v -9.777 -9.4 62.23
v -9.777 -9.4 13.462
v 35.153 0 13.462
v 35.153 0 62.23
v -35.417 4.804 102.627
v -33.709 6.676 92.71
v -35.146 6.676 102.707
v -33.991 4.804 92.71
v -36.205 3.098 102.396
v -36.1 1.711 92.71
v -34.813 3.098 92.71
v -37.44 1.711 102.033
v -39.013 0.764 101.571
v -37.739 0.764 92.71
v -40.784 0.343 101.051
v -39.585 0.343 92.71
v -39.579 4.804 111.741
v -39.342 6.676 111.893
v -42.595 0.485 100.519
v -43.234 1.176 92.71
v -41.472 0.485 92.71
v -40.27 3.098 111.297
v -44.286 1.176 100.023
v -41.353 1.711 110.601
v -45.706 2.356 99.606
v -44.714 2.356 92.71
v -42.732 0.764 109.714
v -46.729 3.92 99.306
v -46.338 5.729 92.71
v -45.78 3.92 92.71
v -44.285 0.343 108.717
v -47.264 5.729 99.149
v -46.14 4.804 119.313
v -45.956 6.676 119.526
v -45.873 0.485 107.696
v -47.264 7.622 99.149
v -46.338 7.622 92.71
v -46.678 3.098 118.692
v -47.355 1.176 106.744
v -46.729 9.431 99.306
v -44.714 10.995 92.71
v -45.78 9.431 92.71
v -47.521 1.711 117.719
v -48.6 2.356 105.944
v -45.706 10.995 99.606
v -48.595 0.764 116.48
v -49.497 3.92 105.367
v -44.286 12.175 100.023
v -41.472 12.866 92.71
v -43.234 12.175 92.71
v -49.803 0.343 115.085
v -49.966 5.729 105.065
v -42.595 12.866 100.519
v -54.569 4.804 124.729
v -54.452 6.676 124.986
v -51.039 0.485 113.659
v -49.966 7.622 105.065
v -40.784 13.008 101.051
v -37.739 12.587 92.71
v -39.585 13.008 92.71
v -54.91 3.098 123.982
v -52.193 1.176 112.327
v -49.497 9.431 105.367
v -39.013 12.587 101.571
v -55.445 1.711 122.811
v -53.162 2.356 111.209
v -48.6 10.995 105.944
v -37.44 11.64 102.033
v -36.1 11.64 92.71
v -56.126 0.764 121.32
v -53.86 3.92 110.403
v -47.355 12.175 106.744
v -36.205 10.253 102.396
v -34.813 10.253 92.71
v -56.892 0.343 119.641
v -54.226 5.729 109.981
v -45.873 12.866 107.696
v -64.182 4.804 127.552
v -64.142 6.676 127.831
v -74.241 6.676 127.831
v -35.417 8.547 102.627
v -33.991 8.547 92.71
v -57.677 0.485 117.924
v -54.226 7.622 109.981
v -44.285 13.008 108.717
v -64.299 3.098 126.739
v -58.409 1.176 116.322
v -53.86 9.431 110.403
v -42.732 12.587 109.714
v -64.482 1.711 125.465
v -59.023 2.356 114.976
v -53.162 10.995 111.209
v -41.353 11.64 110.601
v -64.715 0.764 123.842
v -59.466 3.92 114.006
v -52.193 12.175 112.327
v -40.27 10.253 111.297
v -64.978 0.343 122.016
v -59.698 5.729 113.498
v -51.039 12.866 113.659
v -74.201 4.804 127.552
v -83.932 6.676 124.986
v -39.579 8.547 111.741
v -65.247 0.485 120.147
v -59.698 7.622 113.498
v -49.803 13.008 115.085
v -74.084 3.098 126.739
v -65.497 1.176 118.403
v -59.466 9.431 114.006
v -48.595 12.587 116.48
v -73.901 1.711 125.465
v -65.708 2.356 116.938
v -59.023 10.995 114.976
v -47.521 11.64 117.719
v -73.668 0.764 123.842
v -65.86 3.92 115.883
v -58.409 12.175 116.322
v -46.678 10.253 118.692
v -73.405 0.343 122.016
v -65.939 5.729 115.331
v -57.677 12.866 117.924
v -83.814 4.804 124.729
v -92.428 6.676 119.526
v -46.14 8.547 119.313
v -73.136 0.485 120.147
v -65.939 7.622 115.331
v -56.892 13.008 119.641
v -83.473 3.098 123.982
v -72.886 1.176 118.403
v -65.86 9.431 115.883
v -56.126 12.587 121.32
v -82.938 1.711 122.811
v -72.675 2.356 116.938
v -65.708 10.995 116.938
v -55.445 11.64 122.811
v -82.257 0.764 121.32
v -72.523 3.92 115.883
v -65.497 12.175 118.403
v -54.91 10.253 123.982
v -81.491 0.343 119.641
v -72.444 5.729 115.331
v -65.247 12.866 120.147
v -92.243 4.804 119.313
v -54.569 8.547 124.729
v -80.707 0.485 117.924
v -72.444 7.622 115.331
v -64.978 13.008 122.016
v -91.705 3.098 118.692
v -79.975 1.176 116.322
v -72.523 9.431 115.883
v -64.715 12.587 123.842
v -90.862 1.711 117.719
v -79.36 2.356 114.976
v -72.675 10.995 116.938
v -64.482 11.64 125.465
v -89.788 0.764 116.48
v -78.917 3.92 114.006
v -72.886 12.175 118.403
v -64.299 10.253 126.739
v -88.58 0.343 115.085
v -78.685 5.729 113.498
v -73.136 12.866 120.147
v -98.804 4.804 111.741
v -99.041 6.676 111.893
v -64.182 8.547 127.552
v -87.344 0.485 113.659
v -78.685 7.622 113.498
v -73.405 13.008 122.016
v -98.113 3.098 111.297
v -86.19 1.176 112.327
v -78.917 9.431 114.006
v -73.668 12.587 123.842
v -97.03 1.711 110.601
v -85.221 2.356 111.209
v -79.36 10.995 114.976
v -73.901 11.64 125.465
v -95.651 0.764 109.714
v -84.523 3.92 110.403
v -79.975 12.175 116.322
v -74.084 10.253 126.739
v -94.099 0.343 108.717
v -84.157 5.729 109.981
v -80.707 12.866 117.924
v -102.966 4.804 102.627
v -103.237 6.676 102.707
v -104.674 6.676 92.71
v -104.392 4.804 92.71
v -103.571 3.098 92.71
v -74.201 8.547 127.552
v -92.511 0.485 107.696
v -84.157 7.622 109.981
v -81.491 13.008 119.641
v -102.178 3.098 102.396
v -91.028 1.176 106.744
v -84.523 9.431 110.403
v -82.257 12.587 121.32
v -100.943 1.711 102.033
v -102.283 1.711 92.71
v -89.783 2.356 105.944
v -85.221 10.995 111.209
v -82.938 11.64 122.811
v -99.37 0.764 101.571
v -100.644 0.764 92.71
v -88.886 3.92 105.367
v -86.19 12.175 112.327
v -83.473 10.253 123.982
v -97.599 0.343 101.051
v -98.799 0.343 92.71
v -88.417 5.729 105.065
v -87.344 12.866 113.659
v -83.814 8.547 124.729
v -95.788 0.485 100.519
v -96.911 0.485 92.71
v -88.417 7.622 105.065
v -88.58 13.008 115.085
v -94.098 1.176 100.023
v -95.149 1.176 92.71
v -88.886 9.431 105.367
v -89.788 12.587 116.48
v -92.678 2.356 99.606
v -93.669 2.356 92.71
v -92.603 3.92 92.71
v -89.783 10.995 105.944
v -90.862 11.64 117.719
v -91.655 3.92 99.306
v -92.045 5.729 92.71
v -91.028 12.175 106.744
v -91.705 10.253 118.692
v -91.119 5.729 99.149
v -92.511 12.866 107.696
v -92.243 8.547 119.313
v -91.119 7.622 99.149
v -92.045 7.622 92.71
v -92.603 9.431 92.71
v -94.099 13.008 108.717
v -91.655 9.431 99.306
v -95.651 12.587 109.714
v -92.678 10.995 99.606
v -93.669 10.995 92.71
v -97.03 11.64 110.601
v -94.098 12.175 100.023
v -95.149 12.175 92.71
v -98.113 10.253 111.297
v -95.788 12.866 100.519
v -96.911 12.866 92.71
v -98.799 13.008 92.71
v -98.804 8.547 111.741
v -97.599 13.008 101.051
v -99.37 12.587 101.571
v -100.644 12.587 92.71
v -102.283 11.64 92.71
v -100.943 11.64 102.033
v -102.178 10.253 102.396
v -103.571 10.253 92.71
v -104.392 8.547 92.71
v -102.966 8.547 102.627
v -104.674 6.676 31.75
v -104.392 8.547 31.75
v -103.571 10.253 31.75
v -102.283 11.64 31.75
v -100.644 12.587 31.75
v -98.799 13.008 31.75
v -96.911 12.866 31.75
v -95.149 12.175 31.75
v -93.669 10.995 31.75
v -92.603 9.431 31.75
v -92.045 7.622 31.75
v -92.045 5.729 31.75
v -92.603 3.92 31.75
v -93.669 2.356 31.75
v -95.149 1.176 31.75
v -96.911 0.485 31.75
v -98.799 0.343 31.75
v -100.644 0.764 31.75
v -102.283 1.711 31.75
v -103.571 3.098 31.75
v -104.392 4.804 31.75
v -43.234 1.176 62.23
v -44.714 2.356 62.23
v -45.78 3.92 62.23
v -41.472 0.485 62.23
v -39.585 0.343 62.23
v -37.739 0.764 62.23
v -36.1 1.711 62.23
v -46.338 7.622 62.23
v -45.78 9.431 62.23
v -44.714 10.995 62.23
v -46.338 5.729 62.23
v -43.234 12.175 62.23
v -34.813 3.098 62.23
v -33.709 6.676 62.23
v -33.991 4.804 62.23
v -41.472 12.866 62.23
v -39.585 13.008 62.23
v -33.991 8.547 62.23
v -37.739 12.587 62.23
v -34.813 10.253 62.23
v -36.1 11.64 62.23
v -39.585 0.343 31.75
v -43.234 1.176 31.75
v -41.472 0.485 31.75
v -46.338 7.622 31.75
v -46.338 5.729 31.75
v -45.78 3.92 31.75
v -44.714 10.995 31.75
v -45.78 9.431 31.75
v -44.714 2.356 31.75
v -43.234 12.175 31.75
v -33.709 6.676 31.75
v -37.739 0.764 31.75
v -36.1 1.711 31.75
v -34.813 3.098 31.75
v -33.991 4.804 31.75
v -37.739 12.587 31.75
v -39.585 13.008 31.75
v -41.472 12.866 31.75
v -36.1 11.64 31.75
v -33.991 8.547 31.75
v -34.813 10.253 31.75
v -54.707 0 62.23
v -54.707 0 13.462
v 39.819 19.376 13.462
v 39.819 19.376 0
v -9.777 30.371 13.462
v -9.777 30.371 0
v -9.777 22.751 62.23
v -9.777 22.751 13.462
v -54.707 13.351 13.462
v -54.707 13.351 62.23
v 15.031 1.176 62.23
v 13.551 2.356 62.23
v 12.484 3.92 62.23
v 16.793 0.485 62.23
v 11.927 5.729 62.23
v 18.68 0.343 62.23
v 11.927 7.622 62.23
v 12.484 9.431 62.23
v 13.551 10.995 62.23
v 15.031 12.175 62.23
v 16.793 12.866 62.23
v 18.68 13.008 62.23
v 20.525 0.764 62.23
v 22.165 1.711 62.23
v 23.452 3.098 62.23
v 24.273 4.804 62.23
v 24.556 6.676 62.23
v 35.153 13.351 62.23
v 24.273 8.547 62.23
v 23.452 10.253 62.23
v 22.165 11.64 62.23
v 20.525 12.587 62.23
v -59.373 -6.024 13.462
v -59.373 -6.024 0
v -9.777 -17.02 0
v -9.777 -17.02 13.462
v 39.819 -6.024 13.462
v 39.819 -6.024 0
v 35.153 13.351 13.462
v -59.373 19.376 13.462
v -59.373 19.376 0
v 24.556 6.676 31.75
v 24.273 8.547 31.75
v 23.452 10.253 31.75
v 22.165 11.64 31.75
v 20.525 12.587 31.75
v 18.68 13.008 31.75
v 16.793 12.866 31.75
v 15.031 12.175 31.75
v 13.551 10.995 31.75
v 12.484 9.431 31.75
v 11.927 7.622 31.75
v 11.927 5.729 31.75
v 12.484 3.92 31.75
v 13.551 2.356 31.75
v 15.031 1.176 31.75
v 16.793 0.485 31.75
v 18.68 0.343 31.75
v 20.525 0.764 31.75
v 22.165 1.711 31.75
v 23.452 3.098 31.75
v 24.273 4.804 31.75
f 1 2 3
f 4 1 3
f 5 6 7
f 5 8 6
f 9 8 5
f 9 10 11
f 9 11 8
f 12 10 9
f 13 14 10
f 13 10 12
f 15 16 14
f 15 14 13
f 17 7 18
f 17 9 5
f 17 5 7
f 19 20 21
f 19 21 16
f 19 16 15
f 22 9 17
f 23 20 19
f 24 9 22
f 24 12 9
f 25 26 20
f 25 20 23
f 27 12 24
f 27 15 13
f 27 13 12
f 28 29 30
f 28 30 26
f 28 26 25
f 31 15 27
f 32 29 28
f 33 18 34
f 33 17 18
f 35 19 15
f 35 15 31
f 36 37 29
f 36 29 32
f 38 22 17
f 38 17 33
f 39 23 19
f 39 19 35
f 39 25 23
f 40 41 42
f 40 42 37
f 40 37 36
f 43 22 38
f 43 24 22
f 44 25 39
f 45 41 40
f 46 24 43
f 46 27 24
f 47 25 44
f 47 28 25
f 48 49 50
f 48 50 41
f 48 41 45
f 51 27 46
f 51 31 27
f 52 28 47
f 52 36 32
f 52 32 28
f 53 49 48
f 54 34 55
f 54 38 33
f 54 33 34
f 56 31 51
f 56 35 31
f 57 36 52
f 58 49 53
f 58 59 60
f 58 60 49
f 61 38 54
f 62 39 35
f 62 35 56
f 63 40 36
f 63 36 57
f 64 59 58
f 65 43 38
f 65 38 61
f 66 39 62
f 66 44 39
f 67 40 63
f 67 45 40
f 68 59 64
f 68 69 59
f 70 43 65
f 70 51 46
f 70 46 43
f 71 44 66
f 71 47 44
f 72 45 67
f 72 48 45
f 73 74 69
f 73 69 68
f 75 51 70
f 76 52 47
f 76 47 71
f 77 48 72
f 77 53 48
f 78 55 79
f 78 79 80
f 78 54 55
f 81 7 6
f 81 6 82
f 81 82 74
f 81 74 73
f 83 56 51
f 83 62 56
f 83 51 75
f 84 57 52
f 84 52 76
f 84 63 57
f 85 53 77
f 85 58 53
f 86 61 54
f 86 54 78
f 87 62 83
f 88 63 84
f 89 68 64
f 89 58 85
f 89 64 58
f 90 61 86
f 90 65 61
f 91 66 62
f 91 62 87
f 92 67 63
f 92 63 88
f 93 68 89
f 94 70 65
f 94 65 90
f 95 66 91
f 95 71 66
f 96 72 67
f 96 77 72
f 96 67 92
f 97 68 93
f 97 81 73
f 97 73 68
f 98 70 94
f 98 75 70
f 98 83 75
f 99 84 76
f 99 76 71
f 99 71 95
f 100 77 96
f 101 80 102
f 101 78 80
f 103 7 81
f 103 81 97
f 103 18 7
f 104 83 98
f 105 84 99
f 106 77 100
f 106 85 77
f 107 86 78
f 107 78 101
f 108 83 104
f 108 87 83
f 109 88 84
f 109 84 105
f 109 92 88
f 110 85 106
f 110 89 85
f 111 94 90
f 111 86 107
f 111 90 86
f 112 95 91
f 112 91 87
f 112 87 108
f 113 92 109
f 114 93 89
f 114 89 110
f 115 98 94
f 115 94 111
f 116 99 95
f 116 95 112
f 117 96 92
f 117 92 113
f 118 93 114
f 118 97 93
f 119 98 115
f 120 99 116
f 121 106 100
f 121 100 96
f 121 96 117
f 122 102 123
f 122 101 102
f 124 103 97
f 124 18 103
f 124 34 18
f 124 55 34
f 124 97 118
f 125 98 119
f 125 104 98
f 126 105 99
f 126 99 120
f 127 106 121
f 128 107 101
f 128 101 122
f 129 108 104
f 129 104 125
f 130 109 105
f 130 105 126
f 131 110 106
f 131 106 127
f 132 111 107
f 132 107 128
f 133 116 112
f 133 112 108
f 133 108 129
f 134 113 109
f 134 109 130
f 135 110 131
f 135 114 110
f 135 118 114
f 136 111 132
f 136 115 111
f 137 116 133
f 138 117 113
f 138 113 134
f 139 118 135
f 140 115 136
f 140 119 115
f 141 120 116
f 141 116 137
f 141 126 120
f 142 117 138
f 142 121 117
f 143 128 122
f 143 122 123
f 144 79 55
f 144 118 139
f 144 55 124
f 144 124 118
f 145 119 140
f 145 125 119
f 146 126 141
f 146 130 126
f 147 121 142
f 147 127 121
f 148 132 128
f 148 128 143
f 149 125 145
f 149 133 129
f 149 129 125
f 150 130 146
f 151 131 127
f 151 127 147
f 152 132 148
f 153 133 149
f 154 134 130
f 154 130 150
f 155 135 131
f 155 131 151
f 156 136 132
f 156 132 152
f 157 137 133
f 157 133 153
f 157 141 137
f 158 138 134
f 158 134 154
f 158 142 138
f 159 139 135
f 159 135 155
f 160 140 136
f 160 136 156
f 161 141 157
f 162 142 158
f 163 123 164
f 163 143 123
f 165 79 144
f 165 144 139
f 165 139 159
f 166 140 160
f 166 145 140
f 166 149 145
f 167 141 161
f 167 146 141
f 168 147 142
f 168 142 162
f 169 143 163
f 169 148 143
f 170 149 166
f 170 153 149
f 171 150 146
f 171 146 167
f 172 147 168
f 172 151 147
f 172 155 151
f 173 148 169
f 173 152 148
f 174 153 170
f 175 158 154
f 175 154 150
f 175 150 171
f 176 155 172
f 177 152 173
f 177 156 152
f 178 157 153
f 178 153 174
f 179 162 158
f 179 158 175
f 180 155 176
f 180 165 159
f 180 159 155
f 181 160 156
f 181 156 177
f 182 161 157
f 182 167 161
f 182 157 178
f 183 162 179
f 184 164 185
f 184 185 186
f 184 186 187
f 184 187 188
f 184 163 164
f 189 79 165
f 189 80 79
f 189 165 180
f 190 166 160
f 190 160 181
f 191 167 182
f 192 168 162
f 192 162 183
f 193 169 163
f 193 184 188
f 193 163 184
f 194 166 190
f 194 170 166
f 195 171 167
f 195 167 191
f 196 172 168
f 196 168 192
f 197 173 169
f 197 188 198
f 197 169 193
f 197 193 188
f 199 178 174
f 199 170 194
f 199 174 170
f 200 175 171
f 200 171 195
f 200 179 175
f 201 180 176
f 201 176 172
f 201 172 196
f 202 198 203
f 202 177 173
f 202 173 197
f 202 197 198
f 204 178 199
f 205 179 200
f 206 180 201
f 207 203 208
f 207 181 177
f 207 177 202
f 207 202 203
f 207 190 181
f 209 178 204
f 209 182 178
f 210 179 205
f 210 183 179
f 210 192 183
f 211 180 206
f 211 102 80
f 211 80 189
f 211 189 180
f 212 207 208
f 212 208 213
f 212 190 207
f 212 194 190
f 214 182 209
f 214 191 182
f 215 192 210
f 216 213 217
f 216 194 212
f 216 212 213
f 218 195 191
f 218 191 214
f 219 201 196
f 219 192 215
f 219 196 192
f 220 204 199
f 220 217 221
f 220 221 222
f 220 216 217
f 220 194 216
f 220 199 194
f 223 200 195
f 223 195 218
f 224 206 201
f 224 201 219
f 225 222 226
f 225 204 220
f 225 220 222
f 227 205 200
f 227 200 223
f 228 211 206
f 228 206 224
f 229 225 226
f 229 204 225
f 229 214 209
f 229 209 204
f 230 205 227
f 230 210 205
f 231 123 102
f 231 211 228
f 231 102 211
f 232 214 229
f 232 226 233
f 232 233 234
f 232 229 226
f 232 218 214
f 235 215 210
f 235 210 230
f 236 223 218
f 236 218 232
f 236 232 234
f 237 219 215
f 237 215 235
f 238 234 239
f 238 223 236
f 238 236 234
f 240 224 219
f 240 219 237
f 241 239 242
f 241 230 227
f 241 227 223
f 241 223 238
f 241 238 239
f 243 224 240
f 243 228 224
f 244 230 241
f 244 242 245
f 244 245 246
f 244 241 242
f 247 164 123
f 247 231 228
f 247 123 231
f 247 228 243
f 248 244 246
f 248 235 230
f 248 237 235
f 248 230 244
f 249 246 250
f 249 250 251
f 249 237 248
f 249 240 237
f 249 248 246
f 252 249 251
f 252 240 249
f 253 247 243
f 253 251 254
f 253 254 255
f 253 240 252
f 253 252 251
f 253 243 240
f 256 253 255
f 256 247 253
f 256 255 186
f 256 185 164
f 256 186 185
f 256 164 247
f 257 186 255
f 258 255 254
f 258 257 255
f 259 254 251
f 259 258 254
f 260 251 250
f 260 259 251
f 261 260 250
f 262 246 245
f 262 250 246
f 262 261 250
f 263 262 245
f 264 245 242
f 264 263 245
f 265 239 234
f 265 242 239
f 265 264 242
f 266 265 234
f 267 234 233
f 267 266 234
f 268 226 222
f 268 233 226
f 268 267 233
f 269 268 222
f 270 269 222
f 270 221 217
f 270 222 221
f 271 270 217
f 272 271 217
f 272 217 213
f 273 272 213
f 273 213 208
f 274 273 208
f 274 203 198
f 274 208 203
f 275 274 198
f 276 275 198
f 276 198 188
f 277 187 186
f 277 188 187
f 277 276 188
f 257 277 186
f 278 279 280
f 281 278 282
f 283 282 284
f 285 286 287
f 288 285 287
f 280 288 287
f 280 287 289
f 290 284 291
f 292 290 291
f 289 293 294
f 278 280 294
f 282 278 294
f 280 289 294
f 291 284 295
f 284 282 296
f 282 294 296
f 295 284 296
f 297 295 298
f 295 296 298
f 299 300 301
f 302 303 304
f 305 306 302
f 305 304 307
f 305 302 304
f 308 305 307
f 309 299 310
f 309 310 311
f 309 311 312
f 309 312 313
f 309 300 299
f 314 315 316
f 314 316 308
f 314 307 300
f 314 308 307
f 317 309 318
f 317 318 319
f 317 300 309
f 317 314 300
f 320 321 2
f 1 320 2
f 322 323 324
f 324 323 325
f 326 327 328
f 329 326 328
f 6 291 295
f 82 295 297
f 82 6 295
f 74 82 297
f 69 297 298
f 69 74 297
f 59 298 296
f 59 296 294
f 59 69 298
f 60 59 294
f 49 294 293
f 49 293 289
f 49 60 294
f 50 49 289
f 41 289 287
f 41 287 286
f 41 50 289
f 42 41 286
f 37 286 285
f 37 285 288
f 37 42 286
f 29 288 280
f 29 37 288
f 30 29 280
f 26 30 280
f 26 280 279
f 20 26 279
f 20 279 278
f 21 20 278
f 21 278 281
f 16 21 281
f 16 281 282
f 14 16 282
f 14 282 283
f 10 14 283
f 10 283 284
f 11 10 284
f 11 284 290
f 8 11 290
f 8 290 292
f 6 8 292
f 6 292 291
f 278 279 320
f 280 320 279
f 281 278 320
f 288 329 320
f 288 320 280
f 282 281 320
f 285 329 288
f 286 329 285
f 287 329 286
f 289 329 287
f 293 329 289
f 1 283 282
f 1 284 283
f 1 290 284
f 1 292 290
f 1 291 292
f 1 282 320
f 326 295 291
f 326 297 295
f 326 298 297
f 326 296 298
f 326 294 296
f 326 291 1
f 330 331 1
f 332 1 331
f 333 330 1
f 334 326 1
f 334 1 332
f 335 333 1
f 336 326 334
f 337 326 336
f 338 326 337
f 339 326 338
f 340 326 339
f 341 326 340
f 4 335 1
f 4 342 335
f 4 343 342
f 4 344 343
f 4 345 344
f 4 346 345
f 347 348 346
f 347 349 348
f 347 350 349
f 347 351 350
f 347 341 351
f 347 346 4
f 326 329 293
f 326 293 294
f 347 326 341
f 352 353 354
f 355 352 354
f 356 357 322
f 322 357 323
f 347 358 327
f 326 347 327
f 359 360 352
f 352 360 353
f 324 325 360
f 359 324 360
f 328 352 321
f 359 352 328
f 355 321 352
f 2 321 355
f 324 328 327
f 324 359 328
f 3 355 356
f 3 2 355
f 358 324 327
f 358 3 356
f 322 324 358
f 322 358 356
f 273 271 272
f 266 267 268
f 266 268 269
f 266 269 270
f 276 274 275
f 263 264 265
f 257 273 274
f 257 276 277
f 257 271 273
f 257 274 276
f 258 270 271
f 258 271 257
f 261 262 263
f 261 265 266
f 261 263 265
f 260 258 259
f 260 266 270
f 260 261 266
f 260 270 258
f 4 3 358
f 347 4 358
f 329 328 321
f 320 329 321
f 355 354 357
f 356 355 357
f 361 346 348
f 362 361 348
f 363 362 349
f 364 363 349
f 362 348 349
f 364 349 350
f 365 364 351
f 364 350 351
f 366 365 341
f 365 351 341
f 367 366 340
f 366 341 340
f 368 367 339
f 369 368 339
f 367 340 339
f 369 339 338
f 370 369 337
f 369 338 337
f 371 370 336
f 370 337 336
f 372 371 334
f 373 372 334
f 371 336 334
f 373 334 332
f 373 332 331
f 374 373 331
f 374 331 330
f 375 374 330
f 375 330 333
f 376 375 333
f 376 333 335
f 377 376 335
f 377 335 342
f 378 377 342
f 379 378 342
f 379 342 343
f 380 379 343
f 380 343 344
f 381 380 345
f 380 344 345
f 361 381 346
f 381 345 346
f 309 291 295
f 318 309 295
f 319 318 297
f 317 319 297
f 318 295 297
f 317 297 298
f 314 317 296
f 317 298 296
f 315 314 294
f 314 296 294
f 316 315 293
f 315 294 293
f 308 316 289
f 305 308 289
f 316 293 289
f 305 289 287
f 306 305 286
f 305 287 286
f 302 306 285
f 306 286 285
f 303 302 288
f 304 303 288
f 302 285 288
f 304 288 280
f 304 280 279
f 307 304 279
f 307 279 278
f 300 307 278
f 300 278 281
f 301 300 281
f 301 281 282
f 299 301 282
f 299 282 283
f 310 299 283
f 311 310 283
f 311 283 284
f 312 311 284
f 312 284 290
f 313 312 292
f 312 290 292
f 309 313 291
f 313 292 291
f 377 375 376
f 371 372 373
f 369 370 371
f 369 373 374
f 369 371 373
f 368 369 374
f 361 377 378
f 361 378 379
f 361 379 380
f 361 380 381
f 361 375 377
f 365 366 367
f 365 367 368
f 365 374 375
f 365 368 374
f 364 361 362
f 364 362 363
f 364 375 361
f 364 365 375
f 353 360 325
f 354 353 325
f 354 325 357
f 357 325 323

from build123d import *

# Parameters (mm, degrees)
F1_DEPTH  = 13.462
F3_DEPTH  = 48.768
F4_R      = 6.35
F5_DEPTH  = 30.48
F9_R      = 6.35
F10_DEPTH = 30.48


with BuildPart() as f1:
    # F0 (on Top) → F1 (new body)
    with BuildSketch(Plane.XY):
        Polygon((-9.7772604225, 30.3706423903), (-59.3730975842, 19.3755100023), (-59.3730975842, -6.0244899977), (-9.7772604225, -17.0196223858), (39.8185767392, -6.0244899977), (39.8185767392, 19.3755100023), align=None)
    extrude(amount=F1_DEPTH)

    # F2 (on face) → F3 (join)
    with BuildSketch(Plane.XY.offset(13.462)):
        Polygon((-9.7772604225, 22.7506423903), (-54.7072728696, 13.3510200045), (-54.7072728696, 0), (-9.7772604225, -9.3996223858), (35.1527520247, 0), (35.1527520247, 13.3510200045), align=None)
    extrude(amount=F3_DEPTH)

    # F4 (on face) → F5 (cut)
    with BuildSketch(Plane.XY.offset(62.23)):
        with Locations((18.2055775076, 6.6755100023)):
            Circle(F4_R)
    extrude(amount=-F5_DEPTH, mode=Mode.SUBTRACT)

    # F9 (on face) → F10 (cut)
    with BuildSketch(Plane.XY.offset(62.23)):
        with Locations((-40.0592088699, 6.6755100023)):
            Circle(F9_R)
    extrude(amount=-F10_DEPTH, mode=Mode.SUBTRACT)


with BuildPart() as f8:
    # F8: sweep along a path in F7
    with BuildLine(Plane.XZ) as f8_path:
        Line((-40.0592088699, 62.23), (-40.0592088699, 92.71))
        ThreePointArc((-40.0592088699, 92.71), (-69.1915991699, 121.8423903), (-98.3239894699, 92.71))
        Line((-98.3239894699, 92.71), (-98.3239894699, 31.75))
    # F4 (on face) → F8 (sweep)
    with BuildSketch(Plane.XY.offset(62.23)):
        with Locations((-40.0592088699, 6.6755100023)):
            Circle(F4_R)
    sweep(path=f8_path.line)


solid = Compound([f1.part, f8.part])
